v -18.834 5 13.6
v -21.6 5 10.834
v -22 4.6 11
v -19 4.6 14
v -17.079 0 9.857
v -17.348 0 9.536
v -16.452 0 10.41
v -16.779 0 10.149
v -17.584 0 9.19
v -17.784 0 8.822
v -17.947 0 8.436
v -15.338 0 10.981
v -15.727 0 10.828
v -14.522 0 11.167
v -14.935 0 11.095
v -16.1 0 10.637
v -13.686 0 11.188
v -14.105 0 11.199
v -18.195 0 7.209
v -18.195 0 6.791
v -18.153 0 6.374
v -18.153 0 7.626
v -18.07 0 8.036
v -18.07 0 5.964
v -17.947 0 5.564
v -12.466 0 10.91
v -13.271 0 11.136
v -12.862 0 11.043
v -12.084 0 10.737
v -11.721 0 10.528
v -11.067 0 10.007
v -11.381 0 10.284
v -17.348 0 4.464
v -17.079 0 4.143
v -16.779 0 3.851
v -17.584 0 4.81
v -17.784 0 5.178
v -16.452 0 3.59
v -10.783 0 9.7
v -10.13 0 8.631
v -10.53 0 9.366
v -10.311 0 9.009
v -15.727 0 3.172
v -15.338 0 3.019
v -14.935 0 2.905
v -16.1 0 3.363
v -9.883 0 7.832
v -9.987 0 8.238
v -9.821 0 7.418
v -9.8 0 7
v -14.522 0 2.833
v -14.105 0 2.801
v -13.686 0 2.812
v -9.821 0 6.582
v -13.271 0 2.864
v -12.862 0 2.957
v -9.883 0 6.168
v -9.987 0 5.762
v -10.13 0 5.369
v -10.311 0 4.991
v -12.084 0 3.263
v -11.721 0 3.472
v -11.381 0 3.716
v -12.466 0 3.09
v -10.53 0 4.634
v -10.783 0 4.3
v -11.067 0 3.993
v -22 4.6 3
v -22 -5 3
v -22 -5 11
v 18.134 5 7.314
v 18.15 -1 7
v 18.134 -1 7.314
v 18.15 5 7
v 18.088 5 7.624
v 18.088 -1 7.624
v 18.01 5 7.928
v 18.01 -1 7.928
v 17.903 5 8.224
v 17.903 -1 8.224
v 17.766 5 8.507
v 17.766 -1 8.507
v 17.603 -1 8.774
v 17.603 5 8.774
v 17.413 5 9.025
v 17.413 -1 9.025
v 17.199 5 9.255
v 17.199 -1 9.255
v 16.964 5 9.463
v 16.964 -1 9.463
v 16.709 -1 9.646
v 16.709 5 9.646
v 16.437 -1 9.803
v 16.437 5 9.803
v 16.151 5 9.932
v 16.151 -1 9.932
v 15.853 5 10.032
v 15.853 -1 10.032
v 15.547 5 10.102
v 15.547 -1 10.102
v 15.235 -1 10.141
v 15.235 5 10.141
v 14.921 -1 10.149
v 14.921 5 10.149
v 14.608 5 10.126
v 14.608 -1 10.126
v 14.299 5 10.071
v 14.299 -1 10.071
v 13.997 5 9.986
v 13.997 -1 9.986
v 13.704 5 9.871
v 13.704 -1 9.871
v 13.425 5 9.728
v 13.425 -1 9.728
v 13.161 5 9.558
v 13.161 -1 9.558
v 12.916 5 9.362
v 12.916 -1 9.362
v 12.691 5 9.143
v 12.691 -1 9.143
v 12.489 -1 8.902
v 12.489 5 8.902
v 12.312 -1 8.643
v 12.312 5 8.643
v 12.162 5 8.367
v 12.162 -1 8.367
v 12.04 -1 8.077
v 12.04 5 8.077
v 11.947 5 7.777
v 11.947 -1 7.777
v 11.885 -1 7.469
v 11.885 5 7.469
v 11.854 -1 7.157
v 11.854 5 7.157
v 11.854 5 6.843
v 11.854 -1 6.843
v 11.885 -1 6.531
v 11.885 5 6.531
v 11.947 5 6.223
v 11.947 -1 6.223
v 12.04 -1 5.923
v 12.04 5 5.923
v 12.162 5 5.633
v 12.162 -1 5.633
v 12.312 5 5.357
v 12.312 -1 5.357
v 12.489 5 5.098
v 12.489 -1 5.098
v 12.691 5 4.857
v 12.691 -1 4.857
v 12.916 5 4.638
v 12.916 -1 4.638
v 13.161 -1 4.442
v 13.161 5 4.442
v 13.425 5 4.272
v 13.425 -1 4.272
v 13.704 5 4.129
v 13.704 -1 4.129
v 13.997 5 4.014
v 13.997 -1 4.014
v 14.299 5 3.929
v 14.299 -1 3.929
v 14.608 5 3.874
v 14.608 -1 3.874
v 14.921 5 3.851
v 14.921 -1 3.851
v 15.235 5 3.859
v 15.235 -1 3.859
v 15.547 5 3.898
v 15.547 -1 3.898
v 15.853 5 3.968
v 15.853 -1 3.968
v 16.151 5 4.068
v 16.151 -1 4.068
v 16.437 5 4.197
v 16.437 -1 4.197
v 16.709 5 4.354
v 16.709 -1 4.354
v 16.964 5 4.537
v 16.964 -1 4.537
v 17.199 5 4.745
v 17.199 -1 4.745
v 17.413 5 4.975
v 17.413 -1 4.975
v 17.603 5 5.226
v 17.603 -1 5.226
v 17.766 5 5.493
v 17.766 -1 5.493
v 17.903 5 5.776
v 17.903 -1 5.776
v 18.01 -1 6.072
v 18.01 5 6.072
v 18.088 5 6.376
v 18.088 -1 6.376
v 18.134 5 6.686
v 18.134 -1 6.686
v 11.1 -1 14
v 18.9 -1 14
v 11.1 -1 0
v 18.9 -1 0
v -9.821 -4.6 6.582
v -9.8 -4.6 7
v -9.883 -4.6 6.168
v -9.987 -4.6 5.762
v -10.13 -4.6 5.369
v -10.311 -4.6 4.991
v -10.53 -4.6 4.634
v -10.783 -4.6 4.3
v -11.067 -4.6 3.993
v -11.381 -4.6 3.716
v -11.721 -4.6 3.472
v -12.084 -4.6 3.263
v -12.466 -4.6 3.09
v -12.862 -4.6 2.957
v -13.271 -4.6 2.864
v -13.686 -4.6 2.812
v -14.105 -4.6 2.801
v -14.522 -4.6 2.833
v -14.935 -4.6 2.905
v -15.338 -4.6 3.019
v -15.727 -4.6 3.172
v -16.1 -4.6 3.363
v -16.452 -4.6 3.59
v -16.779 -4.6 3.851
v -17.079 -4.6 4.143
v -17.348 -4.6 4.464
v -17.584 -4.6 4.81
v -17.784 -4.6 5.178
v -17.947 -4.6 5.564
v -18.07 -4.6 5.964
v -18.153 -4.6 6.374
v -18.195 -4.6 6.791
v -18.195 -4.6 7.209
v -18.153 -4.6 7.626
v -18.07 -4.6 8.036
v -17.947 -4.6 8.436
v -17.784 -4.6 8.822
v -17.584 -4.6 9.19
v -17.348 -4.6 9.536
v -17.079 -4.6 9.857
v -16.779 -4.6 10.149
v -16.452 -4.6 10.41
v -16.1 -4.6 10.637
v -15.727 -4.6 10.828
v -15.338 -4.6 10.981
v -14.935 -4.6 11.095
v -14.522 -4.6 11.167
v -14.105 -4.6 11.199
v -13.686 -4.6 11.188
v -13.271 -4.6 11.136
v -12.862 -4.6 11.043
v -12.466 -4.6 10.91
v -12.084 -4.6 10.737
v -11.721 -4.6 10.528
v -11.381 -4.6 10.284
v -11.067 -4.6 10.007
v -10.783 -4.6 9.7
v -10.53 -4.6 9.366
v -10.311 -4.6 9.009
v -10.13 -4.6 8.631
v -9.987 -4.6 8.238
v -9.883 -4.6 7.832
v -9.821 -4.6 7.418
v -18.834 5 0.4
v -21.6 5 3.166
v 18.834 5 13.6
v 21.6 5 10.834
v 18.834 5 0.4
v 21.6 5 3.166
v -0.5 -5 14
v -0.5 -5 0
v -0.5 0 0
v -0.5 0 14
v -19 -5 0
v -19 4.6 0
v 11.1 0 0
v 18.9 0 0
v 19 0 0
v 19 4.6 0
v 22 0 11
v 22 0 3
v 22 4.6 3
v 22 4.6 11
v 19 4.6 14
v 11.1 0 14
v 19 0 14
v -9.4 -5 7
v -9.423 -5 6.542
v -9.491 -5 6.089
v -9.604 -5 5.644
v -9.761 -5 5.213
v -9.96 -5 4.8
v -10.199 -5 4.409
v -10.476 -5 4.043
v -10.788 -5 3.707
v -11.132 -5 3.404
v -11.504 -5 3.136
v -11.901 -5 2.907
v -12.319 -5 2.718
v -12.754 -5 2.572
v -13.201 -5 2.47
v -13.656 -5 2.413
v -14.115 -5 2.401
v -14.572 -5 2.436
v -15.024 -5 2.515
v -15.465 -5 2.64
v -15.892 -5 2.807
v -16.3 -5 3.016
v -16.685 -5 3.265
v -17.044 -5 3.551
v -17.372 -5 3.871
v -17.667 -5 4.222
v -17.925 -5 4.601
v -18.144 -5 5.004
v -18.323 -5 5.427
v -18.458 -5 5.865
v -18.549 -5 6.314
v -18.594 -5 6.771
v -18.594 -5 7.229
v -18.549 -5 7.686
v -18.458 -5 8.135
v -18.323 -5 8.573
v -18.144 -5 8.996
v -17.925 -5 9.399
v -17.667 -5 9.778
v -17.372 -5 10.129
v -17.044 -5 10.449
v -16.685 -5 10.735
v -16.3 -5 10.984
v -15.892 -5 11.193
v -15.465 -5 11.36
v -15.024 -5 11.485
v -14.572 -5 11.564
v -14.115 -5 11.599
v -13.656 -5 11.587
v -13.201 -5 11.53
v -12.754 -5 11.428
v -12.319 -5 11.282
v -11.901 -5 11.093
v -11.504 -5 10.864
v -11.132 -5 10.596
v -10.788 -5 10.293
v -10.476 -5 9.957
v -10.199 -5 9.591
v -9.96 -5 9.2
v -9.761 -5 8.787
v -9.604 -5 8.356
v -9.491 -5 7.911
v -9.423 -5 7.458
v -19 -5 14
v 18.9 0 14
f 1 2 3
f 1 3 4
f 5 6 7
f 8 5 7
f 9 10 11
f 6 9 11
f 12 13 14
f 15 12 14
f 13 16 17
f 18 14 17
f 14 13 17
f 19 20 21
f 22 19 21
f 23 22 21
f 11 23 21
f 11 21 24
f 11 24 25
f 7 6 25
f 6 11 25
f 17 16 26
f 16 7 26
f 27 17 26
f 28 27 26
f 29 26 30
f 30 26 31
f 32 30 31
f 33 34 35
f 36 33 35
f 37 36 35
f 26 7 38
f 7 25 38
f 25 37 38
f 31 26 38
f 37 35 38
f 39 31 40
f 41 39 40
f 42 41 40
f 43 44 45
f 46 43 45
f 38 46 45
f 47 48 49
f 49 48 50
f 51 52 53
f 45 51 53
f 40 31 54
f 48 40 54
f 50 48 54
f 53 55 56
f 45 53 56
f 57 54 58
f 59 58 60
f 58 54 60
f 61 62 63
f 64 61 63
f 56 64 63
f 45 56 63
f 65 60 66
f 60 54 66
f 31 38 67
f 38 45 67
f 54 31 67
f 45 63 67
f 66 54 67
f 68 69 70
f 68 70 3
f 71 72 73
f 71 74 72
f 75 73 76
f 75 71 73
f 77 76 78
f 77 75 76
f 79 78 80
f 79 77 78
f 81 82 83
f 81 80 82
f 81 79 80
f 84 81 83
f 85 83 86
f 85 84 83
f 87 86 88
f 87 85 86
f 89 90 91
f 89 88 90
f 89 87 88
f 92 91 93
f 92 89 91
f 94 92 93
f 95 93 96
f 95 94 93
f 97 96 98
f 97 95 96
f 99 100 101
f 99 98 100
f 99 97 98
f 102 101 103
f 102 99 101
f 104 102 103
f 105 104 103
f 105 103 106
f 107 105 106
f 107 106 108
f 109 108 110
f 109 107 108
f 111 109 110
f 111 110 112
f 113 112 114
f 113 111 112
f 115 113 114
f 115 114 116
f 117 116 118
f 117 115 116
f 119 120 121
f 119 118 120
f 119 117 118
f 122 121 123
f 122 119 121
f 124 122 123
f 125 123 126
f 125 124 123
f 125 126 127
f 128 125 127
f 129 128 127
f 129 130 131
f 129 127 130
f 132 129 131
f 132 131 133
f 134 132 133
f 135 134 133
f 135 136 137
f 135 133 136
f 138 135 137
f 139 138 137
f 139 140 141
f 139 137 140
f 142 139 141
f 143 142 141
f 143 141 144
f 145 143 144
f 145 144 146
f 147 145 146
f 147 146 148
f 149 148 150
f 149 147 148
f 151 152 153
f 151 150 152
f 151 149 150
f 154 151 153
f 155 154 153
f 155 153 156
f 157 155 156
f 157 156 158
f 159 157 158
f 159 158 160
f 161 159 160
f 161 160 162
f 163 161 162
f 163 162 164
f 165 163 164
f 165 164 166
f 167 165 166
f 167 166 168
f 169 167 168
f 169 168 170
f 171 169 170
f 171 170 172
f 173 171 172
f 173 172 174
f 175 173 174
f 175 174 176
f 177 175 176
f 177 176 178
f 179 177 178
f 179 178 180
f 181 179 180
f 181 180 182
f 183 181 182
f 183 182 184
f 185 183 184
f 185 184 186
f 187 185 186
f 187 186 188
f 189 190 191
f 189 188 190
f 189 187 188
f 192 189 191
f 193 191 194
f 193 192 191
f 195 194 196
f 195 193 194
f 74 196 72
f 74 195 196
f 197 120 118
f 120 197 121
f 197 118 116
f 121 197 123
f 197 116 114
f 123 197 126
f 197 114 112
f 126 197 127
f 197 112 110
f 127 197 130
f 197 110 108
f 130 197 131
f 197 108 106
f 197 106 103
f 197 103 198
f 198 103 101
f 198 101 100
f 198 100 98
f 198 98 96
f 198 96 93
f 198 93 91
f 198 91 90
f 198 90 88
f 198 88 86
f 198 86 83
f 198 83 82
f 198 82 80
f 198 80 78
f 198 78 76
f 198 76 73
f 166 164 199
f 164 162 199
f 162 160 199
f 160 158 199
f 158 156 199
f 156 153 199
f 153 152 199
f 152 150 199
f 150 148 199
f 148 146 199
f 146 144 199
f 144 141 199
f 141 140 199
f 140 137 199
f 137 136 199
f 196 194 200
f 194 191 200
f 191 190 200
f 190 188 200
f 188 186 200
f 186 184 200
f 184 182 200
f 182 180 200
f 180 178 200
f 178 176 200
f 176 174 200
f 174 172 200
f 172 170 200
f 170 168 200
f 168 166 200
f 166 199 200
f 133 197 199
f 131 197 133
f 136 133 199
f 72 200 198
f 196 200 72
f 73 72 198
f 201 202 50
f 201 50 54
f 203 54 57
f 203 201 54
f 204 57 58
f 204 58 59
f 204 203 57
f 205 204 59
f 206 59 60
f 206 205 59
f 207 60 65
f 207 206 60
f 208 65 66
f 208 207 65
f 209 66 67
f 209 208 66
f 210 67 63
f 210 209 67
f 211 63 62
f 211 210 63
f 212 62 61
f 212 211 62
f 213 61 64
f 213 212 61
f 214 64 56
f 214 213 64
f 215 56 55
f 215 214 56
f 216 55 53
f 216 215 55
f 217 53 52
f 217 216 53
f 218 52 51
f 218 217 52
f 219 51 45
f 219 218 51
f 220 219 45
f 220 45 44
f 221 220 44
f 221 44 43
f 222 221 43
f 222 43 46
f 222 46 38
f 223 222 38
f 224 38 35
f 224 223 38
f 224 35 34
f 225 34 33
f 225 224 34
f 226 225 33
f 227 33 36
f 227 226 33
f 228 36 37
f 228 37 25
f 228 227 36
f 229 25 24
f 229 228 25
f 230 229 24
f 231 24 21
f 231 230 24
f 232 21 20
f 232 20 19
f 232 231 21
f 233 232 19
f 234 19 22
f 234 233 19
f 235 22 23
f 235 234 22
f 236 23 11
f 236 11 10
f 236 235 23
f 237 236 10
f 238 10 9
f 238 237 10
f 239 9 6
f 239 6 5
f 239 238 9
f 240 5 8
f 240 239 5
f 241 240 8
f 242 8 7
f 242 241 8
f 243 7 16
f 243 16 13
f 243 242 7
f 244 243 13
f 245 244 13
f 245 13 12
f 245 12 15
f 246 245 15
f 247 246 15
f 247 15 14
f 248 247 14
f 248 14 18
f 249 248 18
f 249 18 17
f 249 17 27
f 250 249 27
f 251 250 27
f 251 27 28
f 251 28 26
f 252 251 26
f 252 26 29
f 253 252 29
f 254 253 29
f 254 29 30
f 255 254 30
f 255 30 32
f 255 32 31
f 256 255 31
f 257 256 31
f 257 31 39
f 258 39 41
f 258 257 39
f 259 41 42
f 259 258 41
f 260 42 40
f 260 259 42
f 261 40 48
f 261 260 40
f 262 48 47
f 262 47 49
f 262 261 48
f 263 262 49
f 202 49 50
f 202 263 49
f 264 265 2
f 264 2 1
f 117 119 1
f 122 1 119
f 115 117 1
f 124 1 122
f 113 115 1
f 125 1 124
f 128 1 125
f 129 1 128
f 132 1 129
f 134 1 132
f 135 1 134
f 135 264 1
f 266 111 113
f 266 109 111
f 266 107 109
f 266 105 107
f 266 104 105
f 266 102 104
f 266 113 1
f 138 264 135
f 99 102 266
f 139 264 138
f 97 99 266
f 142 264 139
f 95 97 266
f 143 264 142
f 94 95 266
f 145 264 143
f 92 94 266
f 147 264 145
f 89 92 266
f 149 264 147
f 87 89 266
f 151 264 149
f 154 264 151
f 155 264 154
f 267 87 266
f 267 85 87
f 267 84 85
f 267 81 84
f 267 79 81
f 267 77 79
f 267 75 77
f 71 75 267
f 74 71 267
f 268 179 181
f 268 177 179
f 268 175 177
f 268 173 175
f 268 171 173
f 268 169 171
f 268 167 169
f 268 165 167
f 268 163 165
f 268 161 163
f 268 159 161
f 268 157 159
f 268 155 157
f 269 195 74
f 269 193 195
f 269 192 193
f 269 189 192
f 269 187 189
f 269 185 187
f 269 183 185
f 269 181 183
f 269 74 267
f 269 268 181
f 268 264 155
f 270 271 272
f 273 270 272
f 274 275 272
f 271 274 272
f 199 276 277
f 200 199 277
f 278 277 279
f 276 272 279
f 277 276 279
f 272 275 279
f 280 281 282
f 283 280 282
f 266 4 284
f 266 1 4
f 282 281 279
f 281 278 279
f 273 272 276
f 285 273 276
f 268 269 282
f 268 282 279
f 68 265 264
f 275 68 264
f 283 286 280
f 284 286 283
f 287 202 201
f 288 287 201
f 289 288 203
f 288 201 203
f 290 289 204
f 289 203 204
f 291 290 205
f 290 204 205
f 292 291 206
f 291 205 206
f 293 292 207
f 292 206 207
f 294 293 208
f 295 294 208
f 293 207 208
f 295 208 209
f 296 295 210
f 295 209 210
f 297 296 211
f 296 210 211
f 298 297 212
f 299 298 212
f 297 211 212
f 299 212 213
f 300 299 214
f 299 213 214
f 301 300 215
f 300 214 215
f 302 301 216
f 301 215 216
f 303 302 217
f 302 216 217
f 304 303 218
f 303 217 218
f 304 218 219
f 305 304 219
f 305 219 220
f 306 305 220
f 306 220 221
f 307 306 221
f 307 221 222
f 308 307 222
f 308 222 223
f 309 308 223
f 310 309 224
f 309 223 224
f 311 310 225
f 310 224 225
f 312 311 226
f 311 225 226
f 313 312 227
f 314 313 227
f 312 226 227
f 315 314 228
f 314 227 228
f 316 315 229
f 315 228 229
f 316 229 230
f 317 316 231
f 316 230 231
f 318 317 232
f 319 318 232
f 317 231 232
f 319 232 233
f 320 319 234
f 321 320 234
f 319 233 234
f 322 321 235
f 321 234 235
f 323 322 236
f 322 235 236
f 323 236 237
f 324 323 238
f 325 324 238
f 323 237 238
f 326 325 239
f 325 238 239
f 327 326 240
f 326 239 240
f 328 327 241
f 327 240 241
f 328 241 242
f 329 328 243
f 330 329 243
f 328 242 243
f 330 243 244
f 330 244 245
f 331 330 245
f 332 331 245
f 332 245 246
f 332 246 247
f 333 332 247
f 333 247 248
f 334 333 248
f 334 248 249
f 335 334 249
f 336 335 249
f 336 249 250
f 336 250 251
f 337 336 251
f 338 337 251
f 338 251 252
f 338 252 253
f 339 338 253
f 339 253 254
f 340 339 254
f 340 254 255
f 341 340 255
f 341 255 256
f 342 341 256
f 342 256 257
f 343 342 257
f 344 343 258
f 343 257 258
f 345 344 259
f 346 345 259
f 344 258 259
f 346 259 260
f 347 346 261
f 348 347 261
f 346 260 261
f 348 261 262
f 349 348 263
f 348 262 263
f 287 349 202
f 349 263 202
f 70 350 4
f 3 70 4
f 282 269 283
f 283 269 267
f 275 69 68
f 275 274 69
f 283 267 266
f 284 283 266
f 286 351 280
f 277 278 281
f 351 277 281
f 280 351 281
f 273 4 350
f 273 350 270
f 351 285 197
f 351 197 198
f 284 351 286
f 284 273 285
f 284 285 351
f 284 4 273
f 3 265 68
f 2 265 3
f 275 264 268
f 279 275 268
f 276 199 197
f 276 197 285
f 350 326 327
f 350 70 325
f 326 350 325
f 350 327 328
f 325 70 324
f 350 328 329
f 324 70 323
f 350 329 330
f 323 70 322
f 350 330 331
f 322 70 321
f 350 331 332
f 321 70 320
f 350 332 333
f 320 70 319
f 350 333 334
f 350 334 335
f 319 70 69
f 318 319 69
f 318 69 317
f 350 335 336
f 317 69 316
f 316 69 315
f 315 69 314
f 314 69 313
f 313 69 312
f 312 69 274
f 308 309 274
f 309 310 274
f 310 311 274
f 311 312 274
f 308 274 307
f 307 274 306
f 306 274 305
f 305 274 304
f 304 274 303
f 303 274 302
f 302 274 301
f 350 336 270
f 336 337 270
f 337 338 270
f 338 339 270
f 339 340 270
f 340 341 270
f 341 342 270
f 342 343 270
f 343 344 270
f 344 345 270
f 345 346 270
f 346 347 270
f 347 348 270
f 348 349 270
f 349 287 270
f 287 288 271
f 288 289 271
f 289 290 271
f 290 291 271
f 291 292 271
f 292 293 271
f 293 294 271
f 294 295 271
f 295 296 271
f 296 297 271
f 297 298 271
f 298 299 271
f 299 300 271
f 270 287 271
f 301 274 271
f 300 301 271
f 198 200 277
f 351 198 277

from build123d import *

# Parameters (mm, degrees)
CYLINDER010_R      = 4.2
CYLINDER010_DEPTH  = 5
CYLINDER011_R      = 3.15
CYLINDER011_DEPTH  = 10
BOX016_W           = 22
BOX016_H           = 5
BOX016_DEPTH       = 14
CHAMFER006008_SIZE = 3
CHAMFER006012_SIZE = 0.4
BOX017_W           = 22
BOX017_H           = 5
BOX017_DEPTH       = 14
CHAMFER006013_SIZE = 3
CHAMFER006014_SIZE = 0.4
BOX018_W           = 7.8
BOX018_H           = 2
BOX018_DEPTH       = 14
BOX015_W           = 21.5
BOX015_H           = 5
BOX015_DEPTH       = 14
CHAMFER006009_SIZE = 3
CHAMFER006015_SIZE = 0.4


with BuildPart() as cylinder010:
    # Cylinder010 → Cylinder010 (new body)
    with BuildSketch(Plane(origin=(-14, -5, 7), x_dir=(1, 0, 0), z_dir=(0, 1, 0))):
        Circle(CYLINDER010_R)
    extrude(amount=CYLINDER010_DEPTH)


with BuildPart() as cylinder011:
    # Cylinder011 → Cylinder011 (new body)
    with BuildSketch(Plane(origin=(15, 8, 7), x_dir=(1, 0, 0), z_dir=(0, -1, 0))):
        Circle(CYLINDER011_R)
    extrude(amount=CYLINDER011_DEPTH)


with BuildPart() as chamfer006012:
    # Box016 → Box016 (new body)
    with BuildSketch(Plane(origin=(-22, 0, 0), x_dir=(1, 0, 0), z_dir=(0, 0, 1))):
        with Locations((11, 2.5)):
            Rectangle(BOX016_W, BOX016_H)
    extrude(amount=BOX016_DEPTH)

    # Chamfer006008
    chamfer006008_edges = [chamfer006012.edges().sort_by_distance(p)[0] for p in [
        (-22, 2.5, 14),
        (-22, 2.5, 0),
    ]]
    chamfer(chamfer006008_edges, length=CHAMFER006008_SIZE)

    # Chamfer006012
    chamfer006012_edges = [chamfer006012.edges().sort_by_distance(p)[0] for p in [
        (-22, 5, 7),
        (-20.5, 5, 1.5),
        (-20.5, 5, 12.5),
        (-9.5, 5, 0),
        (-9.5, 5, 14),
    ]]
    chamfer(chamfer006012_edges, length=CHAMFER006012_SIZE)


with BuildPart() as chamfer006014:
    # Box017 → Box017 (new body)
    with BuildSketch(Plane.XY):
        with Locations((11, 2.5)):
            Rectangle(BOX017_W, BOX017_H)
    extrude(amount=BOX017_DEPTH)

    # Chamfer006013
    chamfer006013_edges = [chamfer006014.edges().sort_by_distance(p)[0] for p in [
        (22, 2.5, 14),
        (22, 2.5, 0),
    ]]
    chamfer(chamfer006013_edges, length=CHAMFER006013_SIZE)

    # Chamfer006014
    chamfer006014_edges = [chamfer006014.edges().sort_by_distance(p)[0] for p in [
        (22, 5, 7),
        (20.5, 5, 1.5),
        (20.5, 5, 12.5),
        (9.5, 5, 0),
        (9.5, 5, 14),
    ]]
    chamfer(chamfer006014_edges, length=CHAMFER006014_SIZE)


with BuildPart() as cube017:
    # Box018 → Box018 (new body)
    with BuildSketch(Plane(origin=(11.1, -1, 0), x_dir=(1, 0, 0), z_dir=(0, 0, 1))):
        with Locations((3.9, 1)):
            Rectangle(BOX018_W, BOX018_H)
    extrude(amount=BOX018_DEPTH)


with BuildPart() as chamfer006015:
    # Box015 → Box015 (new body)
    with BuildSketch(Plane(origin=(-22, -5, 0), x_dir=(1, 0, 0), z_dir=(0, 0, 1))):
        with Locations((10.75, 2.5)):
            Rectangle(BOX015_W, BOX015_H)
    extrude(amount=BOX015_DEPTH)

    # Chamfer006009
    chamfer006009_edges = [chamfer006015.edges().sort_by_distance(p)[0] for p in [
        (-22, -2.5, 14),
        (-22, -2.5, 0),
    ]]
    chamfer(chamfer006009_edges, length=CHAMFER006009_SIZE)

    # Fusion005: union Chamfer006012, Chamfer006014, Cube017
    add(chamfer006012.part)
    add(chamfer006014.part)
    add(cube017.part)

    # Cut010011008009003016026008003008002: cut Cylinder011
    add(cylinder011.part, mode=Mode.SUBTRACT)

    # Cut010011008009003016026008003008003: cut Cylinder010
    add(cylinder010.part, mode=Mode.SUBTRACT)

    # Chamfer006015
    chamfer006015_edges = [chamfer006015.edges().sort_by_distance(p)[0] for p in [
        (-18.2, -5, 7),
    ]]
    chamfer(chamfer006015_edges, length=CHAMFER006015_SIZE)


solid = chamfer006015.part
